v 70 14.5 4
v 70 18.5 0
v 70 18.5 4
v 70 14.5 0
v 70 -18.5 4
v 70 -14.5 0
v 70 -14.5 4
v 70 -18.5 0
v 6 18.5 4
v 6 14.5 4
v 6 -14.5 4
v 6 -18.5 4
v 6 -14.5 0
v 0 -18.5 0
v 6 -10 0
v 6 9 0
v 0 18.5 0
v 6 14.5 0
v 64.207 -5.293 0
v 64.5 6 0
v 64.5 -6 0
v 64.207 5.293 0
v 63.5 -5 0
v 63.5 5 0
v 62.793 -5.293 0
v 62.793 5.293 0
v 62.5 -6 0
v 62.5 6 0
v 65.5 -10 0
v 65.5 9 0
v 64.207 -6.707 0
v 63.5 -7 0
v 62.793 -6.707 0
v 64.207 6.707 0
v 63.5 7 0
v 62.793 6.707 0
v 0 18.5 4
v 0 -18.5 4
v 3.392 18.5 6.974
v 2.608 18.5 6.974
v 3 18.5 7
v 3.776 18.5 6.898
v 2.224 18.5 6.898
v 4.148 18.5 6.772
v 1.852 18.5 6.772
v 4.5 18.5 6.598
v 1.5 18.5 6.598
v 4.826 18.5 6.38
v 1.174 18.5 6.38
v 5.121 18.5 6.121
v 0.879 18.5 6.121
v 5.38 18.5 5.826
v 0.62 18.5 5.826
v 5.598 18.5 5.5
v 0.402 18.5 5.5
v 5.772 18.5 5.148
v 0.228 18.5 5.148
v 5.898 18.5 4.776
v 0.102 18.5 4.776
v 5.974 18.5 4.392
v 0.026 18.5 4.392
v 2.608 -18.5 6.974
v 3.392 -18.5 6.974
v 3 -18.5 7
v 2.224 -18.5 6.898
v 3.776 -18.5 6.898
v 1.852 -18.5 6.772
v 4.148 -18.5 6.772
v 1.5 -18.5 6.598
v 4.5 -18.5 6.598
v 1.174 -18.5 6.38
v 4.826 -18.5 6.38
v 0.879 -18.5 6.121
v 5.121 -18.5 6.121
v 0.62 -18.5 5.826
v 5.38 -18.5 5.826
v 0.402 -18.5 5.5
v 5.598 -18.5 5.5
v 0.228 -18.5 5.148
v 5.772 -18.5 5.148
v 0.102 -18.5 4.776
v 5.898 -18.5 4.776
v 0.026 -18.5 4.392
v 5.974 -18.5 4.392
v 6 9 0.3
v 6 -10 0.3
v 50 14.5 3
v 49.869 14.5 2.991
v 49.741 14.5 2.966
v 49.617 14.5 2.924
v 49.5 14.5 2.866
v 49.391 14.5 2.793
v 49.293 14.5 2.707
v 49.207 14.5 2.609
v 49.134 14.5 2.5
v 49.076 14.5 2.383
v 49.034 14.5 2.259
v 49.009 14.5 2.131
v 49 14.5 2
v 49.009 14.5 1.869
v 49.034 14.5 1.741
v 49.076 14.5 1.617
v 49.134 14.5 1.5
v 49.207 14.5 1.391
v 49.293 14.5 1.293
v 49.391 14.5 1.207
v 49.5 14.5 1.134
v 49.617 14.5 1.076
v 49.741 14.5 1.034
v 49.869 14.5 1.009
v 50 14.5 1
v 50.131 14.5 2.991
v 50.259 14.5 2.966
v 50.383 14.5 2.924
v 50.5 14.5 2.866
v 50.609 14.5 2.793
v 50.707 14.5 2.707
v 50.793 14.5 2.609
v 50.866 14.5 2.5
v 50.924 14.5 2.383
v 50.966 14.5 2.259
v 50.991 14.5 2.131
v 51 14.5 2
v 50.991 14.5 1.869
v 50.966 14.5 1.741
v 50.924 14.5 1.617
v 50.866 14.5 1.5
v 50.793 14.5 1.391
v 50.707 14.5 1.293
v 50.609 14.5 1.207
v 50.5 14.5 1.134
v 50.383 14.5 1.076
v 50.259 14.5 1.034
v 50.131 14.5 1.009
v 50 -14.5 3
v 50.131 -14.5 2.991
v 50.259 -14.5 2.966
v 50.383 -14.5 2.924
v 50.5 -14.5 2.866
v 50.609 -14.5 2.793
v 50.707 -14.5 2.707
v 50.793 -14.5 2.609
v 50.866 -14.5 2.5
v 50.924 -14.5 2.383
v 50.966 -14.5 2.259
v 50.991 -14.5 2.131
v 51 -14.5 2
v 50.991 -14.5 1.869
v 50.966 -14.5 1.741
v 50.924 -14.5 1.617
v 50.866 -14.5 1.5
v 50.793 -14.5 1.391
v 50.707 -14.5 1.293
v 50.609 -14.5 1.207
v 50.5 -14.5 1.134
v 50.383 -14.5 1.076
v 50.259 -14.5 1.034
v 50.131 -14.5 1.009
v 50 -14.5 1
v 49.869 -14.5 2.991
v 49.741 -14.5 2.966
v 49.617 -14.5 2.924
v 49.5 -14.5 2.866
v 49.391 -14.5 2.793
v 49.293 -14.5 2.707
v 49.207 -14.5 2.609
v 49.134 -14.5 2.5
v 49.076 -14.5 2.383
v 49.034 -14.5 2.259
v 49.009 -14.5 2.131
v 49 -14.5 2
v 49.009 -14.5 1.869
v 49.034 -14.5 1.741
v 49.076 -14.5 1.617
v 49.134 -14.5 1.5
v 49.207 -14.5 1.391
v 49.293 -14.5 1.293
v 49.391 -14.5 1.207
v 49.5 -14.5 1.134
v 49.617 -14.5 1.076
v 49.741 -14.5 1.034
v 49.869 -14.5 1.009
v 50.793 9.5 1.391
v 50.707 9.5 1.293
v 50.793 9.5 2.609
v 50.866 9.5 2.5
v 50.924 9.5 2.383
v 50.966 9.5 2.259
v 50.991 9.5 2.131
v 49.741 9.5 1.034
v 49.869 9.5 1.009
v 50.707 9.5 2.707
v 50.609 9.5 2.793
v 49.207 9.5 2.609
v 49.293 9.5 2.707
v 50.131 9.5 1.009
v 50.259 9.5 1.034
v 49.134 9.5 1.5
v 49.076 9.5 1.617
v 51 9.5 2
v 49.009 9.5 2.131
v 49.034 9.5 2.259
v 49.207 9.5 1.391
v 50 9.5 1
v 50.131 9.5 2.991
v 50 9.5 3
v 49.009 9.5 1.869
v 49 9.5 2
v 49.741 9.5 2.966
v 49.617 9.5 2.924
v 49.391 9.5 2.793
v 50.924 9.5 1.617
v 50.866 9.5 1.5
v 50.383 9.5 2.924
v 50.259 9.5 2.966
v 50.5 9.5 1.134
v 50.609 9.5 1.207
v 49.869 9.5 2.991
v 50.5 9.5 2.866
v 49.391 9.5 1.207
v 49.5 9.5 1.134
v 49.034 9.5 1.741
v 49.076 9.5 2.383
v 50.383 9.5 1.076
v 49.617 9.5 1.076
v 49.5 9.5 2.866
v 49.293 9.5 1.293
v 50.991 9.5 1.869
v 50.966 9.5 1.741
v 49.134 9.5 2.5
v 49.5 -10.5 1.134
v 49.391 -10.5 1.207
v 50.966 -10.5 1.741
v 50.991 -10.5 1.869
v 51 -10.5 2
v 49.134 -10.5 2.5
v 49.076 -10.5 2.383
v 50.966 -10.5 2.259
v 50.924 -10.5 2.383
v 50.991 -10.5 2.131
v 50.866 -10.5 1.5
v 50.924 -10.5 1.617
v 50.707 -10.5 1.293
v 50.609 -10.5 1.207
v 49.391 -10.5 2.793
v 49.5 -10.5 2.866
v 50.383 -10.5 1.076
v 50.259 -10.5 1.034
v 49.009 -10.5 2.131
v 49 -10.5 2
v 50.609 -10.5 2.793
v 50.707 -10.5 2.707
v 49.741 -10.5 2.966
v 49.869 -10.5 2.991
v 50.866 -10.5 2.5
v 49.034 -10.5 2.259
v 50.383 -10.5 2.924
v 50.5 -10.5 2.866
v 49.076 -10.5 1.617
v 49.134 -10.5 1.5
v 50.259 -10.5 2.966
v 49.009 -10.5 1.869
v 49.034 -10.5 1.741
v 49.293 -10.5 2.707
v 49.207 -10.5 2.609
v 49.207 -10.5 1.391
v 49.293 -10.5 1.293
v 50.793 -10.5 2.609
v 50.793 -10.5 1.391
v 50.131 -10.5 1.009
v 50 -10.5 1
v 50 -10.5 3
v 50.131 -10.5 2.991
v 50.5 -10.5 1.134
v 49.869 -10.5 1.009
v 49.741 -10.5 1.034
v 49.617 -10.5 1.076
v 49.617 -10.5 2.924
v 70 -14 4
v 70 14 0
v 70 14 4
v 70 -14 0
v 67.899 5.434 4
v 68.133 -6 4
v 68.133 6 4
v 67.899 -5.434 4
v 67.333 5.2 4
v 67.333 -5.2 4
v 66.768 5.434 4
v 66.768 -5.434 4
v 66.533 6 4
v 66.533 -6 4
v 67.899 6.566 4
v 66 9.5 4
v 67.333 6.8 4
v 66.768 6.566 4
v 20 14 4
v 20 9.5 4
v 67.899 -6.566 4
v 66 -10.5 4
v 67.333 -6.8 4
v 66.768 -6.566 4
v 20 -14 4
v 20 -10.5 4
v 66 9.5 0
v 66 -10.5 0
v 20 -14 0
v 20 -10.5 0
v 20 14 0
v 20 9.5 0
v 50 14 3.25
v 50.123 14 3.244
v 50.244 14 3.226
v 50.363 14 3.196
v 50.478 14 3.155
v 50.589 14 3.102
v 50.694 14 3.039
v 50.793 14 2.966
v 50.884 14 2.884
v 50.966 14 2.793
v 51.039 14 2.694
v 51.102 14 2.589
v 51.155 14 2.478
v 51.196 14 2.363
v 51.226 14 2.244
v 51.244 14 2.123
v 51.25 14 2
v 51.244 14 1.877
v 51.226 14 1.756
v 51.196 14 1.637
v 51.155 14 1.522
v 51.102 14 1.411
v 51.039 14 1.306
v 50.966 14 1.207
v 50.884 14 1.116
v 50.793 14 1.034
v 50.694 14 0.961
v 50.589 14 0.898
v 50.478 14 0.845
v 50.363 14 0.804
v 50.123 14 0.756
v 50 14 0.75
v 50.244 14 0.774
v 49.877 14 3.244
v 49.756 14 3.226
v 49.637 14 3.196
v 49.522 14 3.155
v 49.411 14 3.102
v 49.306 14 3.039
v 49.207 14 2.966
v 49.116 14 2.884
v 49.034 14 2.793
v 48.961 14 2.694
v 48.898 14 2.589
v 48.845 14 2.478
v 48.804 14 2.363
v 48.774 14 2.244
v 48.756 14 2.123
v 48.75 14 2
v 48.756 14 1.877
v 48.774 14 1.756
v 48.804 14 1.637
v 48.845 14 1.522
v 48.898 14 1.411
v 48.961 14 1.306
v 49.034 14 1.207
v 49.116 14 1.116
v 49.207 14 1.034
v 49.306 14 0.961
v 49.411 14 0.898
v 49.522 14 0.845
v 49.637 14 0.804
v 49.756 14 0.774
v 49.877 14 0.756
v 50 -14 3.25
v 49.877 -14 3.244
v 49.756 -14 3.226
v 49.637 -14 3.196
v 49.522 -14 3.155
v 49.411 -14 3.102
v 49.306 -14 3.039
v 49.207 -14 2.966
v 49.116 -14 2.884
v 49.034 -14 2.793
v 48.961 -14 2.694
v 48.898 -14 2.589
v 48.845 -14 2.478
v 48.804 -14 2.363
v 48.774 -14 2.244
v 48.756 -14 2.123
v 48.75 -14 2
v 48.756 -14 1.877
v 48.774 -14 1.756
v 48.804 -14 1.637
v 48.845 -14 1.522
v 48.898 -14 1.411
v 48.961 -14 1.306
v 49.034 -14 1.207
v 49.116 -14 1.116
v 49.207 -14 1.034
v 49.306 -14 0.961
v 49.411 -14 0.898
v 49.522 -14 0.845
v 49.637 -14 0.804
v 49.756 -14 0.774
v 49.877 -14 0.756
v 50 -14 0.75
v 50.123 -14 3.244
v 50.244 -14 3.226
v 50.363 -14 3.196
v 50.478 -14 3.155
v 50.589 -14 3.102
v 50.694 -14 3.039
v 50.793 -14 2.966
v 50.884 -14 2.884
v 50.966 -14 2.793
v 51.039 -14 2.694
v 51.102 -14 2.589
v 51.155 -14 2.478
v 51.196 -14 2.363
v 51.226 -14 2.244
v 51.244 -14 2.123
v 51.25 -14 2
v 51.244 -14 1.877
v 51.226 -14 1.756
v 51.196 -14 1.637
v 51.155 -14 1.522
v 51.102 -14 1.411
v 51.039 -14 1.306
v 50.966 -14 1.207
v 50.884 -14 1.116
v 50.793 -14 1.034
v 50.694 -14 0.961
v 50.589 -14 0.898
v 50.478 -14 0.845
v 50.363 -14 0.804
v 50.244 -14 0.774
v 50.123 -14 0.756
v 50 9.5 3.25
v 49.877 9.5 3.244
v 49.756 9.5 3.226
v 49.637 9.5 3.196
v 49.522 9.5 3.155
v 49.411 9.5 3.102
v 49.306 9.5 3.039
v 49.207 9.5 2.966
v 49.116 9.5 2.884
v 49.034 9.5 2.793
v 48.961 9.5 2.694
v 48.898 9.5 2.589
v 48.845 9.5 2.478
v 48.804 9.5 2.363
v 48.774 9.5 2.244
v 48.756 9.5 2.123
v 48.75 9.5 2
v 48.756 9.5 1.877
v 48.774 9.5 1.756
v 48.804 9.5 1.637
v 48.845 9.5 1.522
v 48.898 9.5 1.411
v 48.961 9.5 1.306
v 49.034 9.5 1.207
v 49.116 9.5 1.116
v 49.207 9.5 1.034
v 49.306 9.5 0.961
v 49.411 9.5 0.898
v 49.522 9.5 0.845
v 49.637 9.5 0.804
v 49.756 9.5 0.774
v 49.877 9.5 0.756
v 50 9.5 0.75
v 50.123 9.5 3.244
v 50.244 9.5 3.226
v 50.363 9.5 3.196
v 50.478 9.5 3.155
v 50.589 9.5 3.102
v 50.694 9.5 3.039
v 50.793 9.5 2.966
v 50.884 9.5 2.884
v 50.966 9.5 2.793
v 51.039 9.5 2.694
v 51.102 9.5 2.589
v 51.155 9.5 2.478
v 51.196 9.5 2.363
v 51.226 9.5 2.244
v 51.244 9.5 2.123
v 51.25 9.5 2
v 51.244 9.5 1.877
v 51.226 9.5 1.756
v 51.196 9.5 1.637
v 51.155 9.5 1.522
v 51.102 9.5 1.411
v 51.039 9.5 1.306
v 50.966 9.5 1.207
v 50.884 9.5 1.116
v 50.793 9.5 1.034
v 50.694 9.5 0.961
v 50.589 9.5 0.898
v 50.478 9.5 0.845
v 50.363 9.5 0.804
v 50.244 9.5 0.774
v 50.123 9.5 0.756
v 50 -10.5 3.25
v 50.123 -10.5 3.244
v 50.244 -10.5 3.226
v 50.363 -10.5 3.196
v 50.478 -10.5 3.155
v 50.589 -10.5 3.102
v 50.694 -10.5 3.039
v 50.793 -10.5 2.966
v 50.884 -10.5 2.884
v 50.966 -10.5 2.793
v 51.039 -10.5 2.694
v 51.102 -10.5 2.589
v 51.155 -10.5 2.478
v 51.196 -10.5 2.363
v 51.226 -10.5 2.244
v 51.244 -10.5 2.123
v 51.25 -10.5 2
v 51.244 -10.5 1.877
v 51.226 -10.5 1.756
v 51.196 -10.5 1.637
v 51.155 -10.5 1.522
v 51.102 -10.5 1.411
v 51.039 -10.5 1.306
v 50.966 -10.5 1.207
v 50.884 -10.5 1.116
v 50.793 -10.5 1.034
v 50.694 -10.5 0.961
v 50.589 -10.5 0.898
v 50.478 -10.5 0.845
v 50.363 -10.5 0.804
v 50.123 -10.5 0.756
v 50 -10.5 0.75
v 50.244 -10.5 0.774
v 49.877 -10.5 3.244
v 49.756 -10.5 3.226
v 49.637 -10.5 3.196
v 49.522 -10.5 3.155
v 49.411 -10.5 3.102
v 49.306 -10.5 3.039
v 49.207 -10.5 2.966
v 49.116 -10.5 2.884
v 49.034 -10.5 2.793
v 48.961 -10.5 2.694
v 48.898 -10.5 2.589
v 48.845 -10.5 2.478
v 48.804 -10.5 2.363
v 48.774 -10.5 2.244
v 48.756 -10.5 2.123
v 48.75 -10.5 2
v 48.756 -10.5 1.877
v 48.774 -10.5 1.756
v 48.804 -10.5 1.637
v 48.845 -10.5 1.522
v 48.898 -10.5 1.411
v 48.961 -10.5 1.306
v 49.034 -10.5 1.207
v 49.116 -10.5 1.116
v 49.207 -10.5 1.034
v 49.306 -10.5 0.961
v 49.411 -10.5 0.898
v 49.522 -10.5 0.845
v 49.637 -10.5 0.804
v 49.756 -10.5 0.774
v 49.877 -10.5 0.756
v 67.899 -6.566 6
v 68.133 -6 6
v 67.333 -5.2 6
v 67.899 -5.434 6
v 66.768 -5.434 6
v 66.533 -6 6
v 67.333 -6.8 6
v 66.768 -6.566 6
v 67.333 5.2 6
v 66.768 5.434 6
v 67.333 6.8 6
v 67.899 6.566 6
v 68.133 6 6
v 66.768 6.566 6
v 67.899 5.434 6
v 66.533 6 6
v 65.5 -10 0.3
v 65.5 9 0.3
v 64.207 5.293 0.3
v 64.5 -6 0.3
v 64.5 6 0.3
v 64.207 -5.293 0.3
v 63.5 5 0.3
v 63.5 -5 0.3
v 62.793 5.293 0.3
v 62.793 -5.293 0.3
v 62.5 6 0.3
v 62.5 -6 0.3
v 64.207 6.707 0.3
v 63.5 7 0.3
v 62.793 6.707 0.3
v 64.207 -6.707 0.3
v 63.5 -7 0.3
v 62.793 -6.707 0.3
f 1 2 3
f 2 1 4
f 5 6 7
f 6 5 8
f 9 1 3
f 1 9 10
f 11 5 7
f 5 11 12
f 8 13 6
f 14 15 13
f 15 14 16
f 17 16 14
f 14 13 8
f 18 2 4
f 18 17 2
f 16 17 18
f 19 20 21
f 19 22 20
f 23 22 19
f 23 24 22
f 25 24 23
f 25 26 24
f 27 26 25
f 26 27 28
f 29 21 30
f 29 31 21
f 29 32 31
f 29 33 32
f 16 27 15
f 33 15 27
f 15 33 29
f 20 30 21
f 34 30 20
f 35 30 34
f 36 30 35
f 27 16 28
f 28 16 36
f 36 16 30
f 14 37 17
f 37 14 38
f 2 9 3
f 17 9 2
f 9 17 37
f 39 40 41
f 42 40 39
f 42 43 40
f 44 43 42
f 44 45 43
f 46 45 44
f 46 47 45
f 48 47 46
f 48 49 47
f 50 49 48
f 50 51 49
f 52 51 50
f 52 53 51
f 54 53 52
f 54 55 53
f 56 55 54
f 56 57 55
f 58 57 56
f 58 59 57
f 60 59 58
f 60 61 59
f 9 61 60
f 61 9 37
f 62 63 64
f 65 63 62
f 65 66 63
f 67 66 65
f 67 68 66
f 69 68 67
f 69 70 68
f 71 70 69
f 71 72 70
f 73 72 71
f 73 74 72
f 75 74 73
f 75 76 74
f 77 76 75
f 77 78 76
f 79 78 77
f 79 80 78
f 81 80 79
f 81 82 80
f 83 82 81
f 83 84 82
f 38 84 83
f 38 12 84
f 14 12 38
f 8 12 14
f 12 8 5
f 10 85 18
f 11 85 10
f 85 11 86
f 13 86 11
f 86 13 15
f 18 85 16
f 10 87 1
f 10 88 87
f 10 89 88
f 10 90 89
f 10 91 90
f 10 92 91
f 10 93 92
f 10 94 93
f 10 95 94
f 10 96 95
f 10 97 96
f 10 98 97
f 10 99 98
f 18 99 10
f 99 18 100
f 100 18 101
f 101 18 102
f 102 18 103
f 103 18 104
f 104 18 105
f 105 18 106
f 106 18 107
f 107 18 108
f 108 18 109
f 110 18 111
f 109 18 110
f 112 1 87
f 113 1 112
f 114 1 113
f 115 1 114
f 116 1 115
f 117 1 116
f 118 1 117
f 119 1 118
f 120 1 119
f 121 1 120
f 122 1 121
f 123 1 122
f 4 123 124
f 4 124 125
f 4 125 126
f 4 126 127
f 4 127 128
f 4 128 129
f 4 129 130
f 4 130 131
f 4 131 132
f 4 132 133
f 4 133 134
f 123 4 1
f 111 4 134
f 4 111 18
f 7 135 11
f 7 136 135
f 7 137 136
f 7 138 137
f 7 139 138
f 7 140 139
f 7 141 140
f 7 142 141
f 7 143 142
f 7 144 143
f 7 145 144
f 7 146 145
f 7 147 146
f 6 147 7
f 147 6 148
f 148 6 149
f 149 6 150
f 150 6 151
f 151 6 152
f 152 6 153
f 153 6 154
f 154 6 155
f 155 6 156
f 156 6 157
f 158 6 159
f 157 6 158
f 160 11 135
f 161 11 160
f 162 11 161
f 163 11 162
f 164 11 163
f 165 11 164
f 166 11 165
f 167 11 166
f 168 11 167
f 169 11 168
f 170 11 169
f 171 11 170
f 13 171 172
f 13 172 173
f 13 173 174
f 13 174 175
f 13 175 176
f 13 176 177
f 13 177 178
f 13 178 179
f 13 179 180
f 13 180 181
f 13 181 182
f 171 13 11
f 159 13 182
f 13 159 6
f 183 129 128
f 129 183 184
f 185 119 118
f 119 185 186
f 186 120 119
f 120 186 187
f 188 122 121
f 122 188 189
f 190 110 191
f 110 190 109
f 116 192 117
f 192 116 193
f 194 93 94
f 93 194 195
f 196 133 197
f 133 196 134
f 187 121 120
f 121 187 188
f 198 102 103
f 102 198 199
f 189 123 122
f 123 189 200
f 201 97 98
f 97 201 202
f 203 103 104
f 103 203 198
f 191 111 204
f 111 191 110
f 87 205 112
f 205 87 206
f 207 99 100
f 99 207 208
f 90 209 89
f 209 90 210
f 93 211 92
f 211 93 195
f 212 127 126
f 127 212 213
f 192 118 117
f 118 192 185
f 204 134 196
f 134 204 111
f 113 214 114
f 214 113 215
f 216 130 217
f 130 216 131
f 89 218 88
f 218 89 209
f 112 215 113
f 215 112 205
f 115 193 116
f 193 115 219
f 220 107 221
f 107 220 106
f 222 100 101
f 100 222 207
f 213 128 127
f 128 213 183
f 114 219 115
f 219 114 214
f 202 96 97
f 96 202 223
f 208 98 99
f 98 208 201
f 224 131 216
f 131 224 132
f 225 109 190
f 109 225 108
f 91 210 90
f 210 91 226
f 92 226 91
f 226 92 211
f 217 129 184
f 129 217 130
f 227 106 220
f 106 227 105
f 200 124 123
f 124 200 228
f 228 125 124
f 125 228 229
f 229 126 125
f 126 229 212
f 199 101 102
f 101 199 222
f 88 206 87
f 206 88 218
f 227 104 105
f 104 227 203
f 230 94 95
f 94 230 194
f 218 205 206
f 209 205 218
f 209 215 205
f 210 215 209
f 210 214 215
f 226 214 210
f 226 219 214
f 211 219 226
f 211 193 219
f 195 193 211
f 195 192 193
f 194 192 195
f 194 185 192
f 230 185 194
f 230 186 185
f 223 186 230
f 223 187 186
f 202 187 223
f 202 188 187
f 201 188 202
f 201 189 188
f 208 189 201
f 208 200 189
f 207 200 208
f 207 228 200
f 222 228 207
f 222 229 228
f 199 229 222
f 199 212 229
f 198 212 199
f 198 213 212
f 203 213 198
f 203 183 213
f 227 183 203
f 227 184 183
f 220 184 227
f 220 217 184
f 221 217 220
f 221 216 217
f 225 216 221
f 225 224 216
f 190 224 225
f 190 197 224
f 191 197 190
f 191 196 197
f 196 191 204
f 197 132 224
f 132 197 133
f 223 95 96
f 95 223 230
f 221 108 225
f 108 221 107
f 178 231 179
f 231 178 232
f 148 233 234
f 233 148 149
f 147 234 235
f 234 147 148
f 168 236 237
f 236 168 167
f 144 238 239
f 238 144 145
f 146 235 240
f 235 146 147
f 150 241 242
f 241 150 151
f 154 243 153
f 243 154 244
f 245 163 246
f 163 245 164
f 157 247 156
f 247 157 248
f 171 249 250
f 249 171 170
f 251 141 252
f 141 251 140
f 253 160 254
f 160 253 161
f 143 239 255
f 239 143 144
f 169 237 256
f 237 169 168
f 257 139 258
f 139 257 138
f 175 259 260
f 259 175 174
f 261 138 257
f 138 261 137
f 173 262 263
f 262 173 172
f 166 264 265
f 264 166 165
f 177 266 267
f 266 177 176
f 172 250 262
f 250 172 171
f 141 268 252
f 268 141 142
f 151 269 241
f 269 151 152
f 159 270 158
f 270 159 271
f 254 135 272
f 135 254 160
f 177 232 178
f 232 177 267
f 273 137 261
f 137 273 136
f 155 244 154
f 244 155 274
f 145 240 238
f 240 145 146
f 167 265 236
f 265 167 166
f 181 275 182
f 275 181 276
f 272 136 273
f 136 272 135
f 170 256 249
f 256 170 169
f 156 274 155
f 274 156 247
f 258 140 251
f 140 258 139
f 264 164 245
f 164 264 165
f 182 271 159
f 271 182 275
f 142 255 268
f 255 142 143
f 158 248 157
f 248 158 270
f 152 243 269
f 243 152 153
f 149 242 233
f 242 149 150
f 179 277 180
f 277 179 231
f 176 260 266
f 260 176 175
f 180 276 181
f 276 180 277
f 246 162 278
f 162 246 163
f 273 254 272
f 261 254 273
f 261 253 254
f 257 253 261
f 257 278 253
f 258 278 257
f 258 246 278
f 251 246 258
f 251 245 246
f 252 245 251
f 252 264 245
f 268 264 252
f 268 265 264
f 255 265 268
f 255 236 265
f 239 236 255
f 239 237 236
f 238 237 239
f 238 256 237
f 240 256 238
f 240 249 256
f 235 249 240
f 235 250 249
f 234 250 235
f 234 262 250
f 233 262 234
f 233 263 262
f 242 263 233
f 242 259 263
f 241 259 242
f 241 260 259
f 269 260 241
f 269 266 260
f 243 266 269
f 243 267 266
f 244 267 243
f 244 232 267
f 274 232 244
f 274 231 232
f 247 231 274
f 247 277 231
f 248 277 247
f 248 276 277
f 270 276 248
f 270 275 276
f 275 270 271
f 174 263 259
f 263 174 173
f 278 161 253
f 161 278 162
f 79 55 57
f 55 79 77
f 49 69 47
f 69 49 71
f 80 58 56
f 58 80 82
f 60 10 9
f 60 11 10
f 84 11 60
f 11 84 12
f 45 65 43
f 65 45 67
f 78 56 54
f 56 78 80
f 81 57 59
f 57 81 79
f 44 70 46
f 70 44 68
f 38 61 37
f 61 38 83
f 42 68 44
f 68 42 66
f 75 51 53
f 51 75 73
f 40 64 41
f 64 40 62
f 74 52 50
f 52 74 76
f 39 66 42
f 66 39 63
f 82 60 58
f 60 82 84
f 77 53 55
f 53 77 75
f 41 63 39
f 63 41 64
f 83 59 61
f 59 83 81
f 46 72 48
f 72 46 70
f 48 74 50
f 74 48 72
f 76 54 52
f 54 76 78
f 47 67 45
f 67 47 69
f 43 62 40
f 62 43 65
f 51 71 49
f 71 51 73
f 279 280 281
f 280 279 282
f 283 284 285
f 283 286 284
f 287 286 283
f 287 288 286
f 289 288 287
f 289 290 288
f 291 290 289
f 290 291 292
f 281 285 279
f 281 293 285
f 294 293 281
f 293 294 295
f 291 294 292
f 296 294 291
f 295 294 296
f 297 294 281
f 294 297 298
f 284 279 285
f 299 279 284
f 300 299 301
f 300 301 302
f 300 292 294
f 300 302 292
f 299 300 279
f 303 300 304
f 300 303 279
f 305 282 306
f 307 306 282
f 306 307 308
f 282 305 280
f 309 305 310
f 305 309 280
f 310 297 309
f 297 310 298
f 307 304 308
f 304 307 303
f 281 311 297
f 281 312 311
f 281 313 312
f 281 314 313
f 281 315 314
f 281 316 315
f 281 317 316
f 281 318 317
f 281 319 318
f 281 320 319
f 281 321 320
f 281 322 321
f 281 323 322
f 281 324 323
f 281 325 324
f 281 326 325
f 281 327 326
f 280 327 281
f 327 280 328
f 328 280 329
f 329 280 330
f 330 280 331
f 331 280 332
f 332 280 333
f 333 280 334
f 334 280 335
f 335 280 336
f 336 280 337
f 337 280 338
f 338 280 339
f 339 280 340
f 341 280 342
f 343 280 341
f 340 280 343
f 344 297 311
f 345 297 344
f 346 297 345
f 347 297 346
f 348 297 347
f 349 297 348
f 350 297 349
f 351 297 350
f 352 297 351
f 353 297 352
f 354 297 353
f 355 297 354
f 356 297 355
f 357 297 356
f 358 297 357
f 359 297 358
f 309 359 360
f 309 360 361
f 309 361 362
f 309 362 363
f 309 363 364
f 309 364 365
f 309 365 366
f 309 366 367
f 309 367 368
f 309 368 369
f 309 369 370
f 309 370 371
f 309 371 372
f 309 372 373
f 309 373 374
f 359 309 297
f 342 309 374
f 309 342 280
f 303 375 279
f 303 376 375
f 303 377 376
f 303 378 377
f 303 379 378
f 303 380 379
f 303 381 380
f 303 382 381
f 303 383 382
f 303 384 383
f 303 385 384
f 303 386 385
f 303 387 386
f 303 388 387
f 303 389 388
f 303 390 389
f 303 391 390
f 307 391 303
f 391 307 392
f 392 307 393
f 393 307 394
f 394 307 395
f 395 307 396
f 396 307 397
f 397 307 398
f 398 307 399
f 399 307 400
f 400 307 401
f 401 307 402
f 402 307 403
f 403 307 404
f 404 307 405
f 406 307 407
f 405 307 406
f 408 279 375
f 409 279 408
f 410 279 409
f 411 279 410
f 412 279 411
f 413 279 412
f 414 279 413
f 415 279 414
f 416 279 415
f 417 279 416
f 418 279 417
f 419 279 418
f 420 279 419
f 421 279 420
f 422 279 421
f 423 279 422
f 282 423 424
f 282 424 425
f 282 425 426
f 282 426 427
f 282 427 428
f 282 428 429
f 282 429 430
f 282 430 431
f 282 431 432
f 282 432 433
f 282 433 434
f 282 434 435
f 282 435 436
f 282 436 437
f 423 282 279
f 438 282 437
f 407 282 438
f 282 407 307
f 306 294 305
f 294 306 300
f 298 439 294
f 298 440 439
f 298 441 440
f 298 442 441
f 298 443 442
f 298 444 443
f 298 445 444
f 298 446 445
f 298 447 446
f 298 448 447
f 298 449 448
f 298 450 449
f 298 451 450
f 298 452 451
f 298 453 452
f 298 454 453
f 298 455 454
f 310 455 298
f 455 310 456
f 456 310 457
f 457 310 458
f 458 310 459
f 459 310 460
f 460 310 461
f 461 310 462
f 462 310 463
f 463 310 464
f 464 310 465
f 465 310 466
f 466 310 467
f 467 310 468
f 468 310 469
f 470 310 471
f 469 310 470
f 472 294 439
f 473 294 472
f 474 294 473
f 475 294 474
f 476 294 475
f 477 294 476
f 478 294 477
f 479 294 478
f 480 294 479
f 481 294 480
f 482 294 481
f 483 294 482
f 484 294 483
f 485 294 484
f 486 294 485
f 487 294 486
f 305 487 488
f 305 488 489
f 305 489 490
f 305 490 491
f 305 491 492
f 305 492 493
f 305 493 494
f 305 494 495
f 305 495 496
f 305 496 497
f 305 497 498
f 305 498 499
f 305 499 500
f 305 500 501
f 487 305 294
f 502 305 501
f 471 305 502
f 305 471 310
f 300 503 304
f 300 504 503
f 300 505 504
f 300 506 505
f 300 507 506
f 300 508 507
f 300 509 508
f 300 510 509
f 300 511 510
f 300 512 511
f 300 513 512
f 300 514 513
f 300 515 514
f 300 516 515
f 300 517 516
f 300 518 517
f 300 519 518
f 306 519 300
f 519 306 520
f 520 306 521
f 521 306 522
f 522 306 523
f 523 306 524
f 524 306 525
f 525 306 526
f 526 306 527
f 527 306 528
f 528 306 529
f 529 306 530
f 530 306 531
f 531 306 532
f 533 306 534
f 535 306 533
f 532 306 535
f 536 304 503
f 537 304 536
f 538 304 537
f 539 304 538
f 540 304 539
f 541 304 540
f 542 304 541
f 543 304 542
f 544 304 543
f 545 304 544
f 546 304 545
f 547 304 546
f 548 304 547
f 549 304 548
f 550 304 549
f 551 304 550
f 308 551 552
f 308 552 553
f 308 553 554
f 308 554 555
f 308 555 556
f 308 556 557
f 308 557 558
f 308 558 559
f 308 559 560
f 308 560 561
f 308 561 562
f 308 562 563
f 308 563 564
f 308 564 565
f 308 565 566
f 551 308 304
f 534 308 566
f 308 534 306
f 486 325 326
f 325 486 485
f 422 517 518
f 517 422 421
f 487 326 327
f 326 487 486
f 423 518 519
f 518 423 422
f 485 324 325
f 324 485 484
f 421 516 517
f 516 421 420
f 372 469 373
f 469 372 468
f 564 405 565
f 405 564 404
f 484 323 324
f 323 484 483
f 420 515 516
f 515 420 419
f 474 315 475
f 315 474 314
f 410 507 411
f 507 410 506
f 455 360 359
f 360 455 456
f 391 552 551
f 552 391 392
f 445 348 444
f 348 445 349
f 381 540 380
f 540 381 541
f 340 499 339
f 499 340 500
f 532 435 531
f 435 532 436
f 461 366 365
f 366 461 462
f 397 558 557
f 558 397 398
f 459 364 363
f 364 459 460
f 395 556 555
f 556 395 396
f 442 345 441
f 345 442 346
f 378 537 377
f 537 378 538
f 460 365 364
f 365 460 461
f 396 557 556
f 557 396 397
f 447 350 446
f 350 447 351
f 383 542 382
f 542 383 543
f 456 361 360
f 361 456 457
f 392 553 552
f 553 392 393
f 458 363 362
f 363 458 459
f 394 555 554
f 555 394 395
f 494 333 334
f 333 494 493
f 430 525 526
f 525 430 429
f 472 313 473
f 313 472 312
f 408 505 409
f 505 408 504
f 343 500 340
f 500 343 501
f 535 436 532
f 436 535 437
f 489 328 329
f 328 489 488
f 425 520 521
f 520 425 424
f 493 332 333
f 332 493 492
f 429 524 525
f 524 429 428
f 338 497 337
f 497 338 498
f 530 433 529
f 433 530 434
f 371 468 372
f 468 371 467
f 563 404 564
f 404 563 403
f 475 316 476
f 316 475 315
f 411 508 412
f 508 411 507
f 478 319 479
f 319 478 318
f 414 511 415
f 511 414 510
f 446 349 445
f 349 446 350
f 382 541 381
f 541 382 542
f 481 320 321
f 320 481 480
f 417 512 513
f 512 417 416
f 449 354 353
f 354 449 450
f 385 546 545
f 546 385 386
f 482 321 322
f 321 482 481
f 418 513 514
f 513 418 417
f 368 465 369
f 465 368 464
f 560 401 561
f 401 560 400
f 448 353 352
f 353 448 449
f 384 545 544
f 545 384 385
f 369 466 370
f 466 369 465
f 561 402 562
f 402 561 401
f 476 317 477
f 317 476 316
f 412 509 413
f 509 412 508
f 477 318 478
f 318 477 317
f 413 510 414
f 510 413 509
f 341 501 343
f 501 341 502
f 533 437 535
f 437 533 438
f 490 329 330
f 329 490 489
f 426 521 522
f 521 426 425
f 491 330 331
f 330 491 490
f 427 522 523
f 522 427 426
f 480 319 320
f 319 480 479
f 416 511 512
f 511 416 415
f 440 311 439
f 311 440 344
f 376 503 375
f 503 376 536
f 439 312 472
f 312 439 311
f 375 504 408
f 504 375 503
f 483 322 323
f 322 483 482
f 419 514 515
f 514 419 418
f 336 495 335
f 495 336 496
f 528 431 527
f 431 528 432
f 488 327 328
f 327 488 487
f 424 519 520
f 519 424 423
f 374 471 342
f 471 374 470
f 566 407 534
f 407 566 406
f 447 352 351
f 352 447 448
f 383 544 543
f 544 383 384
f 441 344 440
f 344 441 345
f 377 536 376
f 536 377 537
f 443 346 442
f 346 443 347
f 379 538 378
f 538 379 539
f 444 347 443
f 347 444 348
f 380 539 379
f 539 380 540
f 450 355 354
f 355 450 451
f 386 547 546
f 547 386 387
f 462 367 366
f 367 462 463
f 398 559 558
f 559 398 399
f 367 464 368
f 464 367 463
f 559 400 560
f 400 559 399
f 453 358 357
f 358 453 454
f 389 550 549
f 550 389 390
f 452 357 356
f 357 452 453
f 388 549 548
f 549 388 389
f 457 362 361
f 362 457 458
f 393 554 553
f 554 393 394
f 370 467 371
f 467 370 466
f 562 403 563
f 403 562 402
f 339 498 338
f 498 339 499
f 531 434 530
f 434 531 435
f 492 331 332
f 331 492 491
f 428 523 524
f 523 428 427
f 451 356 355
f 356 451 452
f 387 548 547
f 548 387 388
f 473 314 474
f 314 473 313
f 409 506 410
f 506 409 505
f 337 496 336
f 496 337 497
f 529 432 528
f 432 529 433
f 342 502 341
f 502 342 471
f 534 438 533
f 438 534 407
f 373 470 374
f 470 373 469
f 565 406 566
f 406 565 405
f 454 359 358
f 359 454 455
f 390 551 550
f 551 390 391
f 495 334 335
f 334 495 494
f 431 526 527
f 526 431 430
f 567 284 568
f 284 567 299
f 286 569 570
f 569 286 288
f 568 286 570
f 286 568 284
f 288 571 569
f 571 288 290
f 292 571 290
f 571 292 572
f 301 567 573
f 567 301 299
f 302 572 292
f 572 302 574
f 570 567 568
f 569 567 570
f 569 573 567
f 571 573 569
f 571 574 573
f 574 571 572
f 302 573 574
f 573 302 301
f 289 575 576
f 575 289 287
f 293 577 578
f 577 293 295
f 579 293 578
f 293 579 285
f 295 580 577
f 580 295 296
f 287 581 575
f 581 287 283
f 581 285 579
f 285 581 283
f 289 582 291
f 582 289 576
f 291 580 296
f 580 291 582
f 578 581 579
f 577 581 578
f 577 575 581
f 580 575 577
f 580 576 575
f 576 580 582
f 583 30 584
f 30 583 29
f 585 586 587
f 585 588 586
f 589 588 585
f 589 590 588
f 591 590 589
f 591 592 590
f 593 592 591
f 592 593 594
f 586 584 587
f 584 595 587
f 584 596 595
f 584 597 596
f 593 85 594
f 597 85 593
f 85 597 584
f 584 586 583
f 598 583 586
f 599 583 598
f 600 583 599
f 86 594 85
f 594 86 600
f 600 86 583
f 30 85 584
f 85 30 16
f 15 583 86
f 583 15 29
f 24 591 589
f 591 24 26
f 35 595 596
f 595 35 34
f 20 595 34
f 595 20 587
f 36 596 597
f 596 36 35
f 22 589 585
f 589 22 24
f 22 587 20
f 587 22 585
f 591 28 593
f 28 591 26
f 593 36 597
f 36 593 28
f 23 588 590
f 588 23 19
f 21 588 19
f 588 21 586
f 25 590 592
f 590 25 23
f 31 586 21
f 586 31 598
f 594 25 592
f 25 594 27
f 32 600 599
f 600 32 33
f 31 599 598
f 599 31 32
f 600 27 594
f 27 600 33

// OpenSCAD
/*
Chaise longue 
- Un cadre externe avec 2 axes et un petit coussin
- Un cadre Interne
- Une toile
*/
Lce=70;    // Longueur cadre externe
lce=37;    // largeur cadre externe
ep=4;      // Epaisseur du bois
lco=6;     // Largeur du coussin
dist=.5;    // distance entre éléments
Lci=50;    // Long interne
lci= lce - 2*ep - 2*dist;
// accrochage toile
y_t=6;     // distance axe crochet toile
x_t=2;   // distance bord crochet toile
oeillet = 2 ; 
picot=1.6;
Pax=50;   // Position axe sur x
daxe=2;   // diamètre axe
alesage=2.5;
ept=.3 ;   // Epaisseur toile

// Cadre externe
module cadre_externe(){
    difference(){
translate([0,-lce/2,0])cube([Lce,lce,ep]);
translate([lco,-lce/2+ep,0])cube([Lce,lce-2*ep,ep]); 
    } 
  // Axes pour cadre interne
  translate([Pax,lce/2-ep,ep/2]) rotate([90,0,0]) cylinder(d=2,h=ep+dist+dist,$fn=48); 
   translate([Pax,-lce/2+ep,ep/2]) rotate([-90,0,0]) cylinder(d=2,h=ep,$fn=48); 
  // Petit coussin
 //   difference(){
translate([lco/2,-lce/2,ep])rotate([-90,0,0])cylinder(d=lco,h=lce,$fn=48);
//translate([0,-lce/2,0])cube([ep,lce,ep/2]); 
 //   } 
}
cadre_externe();
// Cadre interne
module cadre_interne(){
    difference(){
translate([Lce-Lci,-lce/2+ep+dist,0])cube([Lci,lci,ep]);
translate([Lce-Lci,-lce/2+2*ep,0])cube([Lci-ep,lci-2*ep,ep]); 
// Axes pour cadre interne
  translate([Pax,lce/2-ep,ep/2]) rotate([90,0,0]) cylinder(d=alesage,h=lci+1,$fn=64); 
    }
    // picots maintien toile
    color("blue")translate([Lce - ep/1.5 ,-y_t,ep])cylinder(d=picot,h=ep/2,$fn=8);
    color("blue")translate([Lce - ep/1.5 ,y_t,ep])cylinder(d=picot,h=ep/2,$fn=8);
}
cadre_interne();
module toile() {
    difference() {
    translate([0,-lce/2 + 2*ep +dist])cube([Lce - ep -dist,lci-2*dist-2*ep,ept]);
    translate([Lce -ep -dist - x_t,y_t,0])cylinder(d=oeillet,h=2*ept,$fn=8);
    translate([Lce -ep -dist - x_t,-y_t,0])cylinder(d=oeillet,h=2*ept,$fn=8);;    
    }
}
color("red") toile();
/*
projection(cut=true) translate([0,0,-ep/2]) { cadre_interne() ;
    cadre_externe() ;
}
*/
